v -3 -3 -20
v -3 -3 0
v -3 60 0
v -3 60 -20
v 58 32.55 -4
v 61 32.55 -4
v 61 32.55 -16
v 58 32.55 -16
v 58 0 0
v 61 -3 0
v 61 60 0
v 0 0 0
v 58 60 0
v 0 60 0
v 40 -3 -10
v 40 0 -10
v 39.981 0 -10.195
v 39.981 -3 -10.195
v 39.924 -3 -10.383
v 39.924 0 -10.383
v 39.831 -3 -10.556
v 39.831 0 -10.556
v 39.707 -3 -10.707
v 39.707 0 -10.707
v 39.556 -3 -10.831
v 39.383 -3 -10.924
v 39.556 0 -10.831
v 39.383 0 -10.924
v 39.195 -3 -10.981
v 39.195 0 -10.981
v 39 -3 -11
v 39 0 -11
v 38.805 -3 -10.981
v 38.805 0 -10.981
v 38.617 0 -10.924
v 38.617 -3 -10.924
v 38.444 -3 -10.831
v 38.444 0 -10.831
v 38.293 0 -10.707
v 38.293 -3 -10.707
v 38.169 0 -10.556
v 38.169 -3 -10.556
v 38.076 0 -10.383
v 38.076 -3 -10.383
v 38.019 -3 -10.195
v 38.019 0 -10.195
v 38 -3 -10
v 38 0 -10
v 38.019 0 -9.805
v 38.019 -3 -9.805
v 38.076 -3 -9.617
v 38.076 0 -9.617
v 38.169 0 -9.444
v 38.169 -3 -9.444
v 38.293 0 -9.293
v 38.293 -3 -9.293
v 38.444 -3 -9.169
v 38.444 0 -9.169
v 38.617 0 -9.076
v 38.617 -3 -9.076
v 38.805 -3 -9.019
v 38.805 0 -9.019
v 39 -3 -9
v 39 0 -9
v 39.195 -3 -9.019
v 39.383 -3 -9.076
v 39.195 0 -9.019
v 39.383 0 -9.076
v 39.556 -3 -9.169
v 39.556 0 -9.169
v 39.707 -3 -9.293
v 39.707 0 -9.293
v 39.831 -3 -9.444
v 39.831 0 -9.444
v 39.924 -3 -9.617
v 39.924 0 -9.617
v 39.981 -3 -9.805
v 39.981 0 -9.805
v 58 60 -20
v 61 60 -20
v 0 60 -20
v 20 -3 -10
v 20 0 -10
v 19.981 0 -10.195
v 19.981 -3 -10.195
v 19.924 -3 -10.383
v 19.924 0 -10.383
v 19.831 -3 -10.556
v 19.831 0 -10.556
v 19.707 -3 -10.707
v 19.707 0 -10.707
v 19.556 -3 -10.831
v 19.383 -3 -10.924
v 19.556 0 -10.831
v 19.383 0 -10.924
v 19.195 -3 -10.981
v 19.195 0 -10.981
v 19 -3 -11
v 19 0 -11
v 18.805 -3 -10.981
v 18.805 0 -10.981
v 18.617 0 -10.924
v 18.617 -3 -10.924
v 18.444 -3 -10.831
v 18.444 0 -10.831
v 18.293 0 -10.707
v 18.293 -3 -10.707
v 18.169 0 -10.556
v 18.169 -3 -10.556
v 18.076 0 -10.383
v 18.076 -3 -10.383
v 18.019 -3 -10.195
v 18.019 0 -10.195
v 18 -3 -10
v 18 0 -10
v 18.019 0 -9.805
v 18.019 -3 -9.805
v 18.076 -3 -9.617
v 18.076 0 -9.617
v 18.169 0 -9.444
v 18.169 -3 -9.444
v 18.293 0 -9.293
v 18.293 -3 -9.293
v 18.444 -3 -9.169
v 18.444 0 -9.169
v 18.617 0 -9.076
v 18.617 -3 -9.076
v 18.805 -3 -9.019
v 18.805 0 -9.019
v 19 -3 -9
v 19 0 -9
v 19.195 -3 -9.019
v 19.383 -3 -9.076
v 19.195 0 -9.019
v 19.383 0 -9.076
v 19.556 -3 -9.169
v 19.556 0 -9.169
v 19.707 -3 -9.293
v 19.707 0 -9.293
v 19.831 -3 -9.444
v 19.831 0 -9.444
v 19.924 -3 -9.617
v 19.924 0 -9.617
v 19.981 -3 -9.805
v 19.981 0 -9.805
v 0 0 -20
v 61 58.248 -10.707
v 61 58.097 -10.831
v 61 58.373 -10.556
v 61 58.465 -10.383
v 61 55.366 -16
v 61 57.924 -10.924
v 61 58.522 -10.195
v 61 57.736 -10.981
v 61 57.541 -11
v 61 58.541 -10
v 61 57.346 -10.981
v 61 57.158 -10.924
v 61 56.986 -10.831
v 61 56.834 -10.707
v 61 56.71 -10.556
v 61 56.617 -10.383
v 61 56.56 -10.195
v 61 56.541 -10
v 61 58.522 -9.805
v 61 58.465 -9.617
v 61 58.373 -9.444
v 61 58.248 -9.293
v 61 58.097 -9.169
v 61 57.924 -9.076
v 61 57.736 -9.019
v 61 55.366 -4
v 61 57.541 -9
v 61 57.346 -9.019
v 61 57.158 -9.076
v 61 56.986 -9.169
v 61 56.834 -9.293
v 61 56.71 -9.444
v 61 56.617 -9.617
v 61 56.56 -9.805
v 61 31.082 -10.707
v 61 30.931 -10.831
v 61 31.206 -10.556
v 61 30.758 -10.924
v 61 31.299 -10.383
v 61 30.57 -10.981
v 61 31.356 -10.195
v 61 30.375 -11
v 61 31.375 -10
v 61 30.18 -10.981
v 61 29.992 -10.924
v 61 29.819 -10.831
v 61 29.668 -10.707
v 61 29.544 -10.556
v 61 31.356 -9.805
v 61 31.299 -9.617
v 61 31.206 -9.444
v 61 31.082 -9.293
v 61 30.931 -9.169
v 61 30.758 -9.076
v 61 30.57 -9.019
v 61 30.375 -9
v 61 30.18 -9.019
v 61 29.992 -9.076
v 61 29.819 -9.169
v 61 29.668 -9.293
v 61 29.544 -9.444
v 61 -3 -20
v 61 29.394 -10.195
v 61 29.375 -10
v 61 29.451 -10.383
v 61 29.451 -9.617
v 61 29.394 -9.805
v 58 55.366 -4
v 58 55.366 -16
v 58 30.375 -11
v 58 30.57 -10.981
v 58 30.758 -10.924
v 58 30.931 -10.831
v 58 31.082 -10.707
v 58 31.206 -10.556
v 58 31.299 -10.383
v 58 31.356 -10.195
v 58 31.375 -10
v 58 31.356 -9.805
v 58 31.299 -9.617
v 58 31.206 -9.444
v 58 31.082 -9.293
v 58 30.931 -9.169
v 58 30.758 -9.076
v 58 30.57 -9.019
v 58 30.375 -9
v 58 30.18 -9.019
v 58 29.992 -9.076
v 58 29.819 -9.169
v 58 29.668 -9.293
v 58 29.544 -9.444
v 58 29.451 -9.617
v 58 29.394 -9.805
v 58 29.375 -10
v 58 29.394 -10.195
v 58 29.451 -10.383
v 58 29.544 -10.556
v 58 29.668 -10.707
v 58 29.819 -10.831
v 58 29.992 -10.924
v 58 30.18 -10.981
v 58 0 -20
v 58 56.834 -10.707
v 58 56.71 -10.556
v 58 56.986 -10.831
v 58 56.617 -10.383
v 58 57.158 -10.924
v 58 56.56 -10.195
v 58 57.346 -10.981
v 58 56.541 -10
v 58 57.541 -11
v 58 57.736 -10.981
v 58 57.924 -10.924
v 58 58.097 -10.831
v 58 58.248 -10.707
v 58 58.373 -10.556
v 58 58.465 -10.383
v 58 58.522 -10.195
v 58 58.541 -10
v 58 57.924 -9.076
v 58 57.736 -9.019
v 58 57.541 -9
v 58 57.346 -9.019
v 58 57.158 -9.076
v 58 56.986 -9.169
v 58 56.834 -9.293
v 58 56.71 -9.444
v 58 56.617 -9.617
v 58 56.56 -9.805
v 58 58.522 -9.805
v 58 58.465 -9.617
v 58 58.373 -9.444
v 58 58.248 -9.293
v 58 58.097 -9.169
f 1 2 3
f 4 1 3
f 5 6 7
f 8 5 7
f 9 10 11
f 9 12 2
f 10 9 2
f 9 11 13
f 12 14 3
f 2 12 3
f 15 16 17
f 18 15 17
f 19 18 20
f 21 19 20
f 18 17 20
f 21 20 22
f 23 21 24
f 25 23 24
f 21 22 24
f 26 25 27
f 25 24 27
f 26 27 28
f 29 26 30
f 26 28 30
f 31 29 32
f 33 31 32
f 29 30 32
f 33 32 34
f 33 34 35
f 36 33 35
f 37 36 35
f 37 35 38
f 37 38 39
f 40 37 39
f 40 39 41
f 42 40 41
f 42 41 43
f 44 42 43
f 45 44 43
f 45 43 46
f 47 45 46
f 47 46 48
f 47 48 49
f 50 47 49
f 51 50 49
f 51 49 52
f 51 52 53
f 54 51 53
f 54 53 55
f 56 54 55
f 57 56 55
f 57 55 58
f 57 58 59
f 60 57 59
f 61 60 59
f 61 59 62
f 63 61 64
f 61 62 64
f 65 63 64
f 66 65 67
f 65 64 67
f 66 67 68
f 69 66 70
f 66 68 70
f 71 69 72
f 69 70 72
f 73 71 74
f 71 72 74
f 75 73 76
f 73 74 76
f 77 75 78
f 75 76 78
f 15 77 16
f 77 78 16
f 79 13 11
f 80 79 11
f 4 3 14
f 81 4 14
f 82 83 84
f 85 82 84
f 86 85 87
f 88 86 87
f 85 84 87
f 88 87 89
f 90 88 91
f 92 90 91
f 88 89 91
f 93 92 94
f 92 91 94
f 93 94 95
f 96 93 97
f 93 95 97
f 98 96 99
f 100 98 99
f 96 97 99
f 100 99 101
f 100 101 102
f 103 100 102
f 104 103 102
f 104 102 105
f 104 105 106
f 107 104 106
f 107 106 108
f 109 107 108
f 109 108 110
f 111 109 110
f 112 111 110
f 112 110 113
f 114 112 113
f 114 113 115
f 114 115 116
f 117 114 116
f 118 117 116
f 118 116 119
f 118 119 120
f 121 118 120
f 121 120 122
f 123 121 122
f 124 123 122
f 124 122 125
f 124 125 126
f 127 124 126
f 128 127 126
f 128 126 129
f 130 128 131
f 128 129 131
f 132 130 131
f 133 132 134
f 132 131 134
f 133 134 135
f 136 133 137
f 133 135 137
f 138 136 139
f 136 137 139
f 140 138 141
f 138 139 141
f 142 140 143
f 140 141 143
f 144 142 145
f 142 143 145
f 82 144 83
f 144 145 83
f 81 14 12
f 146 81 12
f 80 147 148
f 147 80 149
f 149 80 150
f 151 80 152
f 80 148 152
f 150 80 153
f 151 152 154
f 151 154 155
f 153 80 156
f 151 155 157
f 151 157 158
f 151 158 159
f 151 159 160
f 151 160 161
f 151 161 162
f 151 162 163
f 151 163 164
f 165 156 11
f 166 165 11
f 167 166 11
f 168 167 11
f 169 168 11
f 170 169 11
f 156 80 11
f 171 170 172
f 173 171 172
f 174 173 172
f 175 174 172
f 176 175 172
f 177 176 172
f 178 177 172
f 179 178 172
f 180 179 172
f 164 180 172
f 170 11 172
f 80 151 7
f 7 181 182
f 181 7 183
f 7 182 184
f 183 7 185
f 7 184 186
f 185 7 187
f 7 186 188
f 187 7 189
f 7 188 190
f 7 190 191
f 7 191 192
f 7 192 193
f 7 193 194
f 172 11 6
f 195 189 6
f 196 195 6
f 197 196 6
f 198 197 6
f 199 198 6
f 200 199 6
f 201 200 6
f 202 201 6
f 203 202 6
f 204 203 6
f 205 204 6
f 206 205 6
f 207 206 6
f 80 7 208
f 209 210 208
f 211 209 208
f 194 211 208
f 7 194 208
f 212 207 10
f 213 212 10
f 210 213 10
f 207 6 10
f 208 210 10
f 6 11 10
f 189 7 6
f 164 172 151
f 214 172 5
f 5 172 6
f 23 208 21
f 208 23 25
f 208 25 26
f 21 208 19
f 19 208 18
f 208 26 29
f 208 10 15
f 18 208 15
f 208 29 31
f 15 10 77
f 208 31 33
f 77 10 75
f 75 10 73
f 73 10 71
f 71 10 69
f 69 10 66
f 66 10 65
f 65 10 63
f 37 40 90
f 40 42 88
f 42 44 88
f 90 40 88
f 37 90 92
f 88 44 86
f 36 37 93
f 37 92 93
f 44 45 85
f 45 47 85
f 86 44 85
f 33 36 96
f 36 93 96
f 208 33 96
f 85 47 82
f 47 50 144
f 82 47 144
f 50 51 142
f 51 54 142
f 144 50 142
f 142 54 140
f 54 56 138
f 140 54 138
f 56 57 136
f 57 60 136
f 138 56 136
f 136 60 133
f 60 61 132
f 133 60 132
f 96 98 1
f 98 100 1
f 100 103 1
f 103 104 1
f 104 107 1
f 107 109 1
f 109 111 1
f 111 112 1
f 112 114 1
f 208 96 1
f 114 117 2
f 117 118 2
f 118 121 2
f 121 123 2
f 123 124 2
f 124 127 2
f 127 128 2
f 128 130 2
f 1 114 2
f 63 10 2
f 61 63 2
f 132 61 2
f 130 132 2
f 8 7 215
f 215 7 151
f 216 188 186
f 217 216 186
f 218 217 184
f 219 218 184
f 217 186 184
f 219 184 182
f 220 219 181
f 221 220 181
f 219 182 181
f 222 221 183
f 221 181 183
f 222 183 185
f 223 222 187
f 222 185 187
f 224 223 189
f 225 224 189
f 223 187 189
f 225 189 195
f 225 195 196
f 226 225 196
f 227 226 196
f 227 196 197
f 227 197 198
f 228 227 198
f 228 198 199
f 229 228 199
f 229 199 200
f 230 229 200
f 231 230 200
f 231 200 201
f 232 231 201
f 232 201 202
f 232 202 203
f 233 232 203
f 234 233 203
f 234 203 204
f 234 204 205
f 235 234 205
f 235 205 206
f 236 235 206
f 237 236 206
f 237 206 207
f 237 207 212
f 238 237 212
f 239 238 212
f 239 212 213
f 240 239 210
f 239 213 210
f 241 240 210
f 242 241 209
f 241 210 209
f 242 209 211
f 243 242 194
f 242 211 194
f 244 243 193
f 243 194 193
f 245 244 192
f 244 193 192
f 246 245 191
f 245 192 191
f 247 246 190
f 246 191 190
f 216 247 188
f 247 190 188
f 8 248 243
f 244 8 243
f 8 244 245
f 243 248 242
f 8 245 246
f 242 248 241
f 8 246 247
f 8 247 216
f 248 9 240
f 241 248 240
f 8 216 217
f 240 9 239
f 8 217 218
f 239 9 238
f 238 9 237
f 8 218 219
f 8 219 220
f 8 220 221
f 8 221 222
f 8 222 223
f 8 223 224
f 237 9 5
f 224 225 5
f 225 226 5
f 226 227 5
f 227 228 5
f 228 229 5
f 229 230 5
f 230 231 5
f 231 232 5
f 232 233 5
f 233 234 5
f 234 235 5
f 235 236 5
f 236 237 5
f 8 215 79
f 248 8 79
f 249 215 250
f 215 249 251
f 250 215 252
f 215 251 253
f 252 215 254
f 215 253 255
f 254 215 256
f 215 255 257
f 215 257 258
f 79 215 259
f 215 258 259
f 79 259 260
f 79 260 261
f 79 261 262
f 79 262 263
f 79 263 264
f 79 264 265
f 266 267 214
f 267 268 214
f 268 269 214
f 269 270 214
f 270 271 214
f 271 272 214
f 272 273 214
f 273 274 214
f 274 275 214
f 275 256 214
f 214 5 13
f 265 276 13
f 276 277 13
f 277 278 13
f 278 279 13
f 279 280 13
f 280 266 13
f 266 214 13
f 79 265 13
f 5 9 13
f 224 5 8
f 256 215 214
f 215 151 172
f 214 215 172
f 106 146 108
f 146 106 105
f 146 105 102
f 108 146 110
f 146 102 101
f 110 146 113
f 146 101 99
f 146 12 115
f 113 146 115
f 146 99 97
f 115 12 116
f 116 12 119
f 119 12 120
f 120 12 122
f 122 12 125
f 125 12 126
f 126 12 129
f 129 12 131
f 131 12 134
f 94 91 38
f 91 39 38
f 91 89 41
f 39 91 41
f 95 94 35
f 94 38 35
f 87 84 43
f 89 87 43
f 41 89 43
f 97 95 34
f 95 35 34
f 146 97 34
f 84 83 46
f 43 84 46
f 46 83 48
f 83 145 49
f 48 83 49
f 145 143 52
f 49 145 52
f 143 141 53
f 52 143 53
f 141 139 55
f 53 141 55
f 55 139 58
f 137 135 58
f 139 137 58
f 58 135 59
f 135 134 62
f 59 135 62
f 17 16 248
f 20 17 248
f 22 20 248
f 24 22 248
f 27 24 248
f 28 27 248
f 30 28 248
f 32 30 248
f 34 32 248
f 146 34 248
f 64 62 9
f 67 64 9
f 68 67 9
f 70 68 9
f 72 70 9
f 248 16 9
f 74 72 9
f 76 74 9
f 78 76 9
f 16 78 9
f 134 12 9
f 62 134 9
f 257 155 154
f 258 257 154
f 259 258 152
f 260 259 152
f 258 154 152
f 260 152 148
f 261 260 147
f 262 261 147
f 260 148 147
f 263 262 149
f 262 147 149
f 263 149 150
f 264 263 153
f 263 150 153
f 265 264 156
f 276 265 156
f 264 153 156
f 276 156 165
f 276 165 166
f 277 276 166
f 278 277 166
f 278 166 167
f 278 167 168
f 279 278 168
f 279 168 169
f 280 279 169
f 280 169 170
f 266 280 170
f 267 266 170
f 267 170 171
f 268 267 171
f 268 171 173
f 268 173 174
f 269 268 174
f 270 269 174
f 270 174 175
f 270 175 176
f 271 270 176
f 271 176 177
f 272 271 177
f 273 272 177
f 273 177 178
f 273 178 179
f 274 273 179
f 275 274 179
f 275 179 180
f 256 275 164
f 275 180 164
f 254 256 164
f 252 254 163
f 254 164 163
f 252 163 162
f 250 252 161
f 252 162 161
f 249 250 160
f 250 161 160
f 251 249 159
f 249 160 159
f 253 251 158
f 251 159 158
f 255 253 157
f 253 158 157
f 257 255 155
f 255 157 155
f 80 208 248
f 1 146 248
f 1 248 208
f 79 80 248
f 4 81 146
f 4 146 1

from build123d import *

# Parameters (mm, degrees)
BOSS_EXTRUDE1_DEPTH = 20
SKETCH3_R           = 1
CUT_EXTRUDE1_DEPTH  = 10
SKETCH4_R           = 1
CUT_EXTRUDE2_DEPTH  = 10


with BuildPart() as part:
    # Sketch1 → Boss-Extrude1 (new body)
    with BuildSketch(Plane.XY):
        Polygon((0, 0), (58, 0), (58, 60), (61, 60), (61, -3), (-3, -3), (-3, 60), (0, 60), align=None)
    extrude(amount=-BOSS_EXTRUDE1_DEPTH)

    # Sketch3 → Cut-Extrude1 (cut)
    with BuildSketch(Plane(origin=(61, 0, 0), x_dir=(0, 0, -1), z_dir=(1, 0, 0))):
        with Locations((10, 57.541077174)):
            Circle(SKETCH3_R)
        with Locations((10, 30.375)):
            Circle(SKETCH3_R)
        Polygon((10, 32.55), (16, 32.55), (16, 55.366077174), (10, 55.366077174), (4, 55.366077174), (4, 32.55), align=None)
    extrude(amount=-CUT_EXTRUDE1_DEPTH, mode=Mode.SUBTRACT)

    # Sketch4 → Cut-Extrude2 (cut)
    with BuildSketch(Plane(origin=(0, 0, 0), x_dir=(1, 0, 0), z_dir=(0, 1, 0))):
        with Locations((19, 10)):
            Circle(SKETCH4_R)
        with Locations((39, 10)):
            Circle(SKETCH4_R)
    extrude(amount=-CUT_EXTRUDE2_DEPTH, mode=Mode.SUBTRACT)


solid = part.part
